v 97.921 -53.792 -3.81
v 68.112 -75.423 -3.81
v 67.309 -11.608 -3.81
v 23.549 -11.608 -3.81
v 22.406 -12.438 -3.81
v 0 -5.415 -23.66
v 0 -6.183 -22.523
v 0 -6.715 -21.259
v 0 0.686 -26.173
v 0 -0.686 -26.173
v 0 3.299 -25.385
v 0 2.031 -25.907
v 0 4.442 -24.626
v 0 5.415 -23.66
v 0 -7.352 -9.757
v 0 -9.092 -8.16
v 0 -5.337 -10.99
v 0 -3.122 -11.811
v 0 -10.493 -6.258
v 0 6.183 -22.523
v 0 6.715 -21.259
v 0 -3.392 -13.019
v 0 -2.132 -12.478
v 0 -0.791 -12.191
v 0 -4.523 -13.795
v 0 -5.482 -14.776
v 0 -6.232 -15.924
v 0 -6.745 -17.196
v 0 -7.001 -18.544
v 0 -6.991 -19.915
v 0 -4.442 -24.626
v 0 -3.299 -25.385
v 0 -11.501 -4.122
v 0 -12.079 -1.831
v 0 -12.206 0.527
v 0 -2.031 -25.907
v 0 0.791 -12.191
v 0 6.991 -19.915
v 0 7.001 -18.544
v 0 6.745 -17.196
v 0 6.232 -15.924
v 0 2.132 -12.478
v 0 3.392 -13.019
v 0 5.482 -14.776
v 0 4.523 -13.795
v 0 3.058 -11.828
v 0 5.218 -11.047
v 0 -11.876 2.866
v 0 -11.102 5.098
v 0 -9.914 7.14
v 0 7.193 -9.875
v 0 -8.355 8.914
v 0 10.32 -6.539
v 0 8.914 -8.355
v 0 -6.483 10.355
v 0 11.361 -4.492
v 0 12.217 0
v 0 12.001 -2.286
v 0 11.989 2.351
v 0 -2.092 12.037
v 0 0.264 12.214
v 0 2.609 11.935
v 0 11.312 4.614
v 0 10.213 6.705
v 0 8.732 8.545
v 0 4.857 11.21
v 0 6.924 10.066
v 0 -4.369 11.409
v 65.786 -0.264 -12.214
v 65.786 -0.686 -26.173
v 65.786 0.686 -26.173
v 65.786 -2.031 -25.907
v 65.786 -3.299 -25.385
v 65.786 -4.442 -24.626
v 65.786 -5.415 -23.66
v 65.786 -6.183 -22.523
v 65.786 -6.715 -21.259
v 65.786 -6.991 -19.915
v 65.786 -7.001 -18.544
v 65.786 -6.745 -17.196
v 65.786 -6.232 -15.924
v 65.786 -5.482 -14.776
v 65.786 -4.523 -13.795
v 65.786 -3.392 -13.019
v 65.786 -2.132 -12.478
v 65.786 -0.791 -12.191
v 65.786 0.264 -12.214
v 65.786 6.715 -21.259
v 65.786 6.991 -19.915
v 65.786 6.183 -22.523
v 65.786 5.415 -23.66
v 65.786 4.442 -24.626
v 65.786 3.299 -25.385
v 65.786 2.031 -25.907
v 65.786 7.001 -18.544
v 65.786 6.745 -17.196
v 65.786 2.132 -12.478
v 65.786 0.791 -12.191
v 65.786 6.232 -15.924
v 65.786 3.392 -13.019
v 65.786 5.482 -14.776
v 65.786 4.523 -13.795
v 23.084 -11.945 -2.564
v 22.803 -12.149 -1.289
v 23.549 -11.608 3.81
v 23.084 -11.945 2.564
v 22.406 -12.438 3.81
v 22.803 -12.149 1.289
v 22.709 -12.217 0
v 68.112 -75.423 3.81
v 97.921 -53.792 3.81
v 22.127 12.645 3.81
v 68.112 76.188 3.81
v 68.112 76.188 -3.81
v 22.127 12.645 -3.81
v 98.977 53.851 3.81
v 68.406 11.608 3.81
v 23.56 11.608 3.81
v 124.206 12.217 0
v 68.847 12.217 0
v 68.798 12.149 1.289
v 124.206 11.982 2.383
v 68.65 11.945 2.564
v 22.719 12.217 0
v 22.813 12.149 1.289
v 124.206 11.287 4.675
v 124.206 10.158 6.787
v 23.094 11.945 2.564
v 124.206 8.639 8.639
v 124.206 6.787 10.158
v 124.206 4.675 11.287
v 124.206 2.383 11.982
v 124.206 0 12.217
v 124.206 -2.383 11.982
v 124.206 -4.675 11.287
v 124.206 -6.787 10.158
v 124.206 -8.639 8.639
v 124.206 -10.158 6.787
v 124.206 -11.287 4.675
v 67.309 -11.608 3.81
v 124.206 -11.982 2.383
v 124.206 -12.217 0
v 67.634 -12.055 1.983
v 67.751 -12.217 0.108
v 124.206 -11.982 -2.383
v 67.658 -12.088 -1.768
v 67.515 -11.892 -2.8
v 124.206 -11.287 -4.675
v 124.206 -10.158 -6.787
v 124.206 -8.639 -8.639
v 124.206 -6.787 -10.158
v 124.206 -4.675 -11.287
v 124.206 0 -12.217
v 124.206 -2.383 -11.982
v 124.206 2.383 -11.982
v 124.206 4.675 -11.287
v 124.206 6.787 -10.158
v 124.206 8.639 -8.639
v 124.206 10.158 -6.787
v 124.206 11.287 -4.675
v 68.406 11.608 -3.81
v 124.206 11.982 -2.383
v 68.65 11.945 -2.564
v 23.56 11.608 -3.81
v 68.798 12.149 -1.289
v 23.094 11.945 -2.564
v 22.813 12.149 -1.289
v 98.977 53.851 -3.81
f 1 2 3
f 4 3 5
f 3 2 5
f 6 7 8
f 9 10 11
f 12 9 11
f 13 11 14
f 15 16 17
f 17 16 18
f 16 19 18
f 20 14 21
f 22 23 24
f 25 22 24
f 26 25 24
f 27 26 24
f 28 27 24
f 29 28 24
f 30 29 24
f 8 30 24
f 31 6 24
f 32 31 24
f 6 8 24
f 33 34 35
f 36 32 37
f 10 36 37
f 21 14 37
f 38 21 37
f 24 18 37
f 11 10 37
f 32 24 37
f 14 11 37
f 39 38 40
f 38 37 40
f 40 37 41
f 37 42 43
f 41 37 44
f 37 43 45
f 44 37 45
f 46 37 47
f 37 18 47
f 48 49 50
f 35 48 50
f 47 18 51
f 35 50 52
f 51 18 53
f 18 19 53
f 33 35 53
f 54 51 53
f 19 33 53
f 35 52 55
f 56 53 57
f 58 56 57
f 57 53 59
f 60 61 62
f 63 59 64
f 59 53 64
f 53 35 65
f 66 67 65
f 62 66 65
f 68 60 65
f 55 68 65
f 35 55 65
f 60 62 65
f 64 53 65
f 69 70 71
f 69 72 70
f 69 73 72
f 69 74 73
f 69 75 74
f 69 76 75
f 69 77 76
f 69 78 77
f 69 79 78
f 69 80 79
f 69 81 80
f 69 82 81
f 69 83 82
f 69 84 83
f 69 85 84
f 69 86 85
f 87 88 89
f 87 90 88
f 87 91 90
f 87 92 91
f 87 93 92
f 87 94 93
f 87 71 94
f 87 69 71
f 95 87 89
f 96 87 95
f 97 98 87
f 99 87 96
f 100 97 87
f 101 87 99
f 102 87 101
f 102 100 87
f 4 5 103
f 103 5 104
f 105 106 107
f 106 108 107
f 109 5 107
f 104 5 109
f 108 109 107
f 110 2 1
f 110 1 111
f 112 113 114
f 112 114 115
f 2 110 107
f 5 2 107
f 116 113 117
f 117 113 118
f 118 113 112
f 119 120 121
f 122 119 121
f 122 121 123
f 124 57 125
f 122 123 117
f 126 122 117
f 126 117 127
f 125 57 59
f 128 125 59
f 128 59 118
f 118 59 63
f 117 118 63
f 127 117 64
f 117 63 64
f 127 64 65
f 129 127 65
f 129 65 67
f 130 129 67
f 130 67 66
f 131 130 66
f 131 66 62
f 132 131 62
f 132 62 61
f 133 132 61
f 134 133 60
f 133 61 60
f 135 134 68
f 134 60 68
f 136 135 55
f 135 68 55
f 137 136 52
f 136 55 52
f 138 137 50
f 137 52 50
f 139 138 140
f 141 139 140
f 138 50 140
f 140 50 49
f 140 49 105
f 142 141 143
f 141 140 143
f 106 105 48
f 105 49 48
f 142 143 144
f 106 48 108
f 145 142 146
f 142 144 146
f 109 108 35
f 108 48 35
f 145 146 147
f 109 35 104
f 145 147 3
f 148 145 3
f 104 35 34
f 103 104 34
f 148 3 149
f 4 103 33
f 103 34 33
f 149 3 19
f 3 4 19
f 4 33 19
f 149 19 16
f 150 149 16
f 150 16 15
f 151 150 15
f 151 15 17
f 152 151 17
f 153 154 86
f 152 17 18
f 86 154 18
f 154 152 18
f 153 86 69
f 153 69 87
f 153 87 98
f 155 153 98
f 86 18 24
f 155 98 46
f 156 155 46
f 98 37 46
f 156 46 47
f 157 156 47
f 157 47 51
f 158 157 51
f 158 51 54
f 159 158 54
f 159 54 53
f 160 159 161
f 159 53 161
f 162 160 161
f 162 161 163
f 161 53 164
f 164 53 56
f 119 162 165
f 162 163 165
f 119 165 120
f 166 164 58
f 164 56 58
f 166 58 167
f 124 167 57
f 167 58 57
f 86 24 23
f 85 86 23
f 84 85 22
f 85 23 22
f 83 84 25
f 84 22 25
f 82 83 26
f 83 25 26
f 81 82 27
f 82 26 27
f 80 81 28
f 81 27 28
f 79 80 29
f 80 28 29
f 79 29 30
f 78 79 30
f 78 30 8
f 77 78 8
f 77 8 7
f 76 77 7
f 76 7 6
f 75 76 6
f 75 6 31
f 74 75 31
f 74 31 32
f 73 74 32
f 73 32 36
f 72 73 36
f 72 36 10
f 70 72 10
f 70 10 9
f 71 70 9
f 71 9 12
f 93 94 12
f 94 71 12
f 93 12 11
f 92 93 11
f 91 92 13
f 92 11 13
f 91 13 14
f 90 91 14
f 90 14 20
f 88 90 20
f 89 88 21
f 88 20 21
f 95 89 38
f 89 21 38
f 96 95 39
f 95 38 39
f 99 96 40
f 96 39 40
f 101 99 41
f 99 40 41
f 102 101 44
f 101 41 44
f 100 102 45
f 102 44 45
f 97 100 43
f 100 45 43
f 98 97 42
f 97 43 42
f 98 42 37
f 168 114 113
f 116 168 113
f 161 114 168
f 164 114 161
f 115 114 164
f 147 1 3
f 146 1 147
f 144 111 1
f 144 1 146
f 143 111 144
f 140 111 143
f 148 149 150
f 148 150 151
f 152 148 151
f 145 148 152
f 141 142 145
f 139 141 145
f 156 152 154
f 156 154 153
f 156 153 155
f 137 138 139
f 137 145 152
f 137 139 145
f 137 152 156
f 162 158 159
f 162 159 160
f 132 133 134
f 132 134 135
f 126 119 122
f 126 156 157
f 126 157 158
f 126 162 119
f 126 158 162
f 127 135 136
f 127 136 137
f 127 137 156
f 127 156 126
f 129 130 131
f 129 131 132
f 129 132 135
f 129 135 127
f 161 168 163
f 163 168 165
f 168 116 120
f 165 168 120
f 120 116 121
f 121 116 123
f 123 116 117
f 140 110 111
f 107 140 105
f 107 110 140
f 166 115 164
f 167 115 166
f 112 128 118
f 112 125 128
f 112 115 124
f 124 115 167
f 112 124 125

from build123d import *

# Parameters (mm, degrees)
F0_R      = 12.2171028197
F1_DEPTH  = 124.206
F14_R     = 7.0299846098
F15_DEPTH = 65.786
F10_E8_W  = 77.8220303902
F10_E8_H  = 7.62
F16_DEPTH = 36.83
F11_E6_W  = 78.43691694
F11_E6_H  = 7.62
F17_DEPTH = 38.1


# Not quite as in the source:
# - the program builds the solid bodies; features that only make, move or delete a surface that nothing else refers to are left out


with BuildPart() as f1:
    # F0 (on Right) → F1 (new body)
    with BuildSketch(Plane.YZ):
        Circle(F0_R)
    extrude(amount=F1_DEPTH)

    # F14 (on Right) → F15 (join)
    with BuildSketch(Plane.YZ):
        with Locations((0, -19.1768705845)):
            Circle(F14_R)
    extrude(amount=F15_DEPTH)

    # F10_E8 (on explicit) → F16 (join)
    with BuildSketch(Plane(origin=(68.1120529771, -75.4232108593, -3.81), x_dir=(-0.5873196318, 0.8093550828, 0), z_dir=(0.8093550828, 0.5873196318, 0))):
        with Locations((38.9110151951, 3.81)):
            Rectangle(F10_E8_W, F10_E8_H)
    extrude(amount=F16_DEPTH)

    # F11_E6 (on explicit) → F17 (join)
    with BuildSketch(Plane(origin=(68.1120529771, 76.1882886291, -3.81), x_dir=(-0.5862686387, -0.8101167097, 0), z_dir=(-0.8101167097, 0.5862686387, 0))):
        with Locations((39.21845847, 3.81)):
            Rectangle(F11_E6_W, F11_E6_H)
    extrude(amount=-F17_DEPTH)


solid = f1.part
